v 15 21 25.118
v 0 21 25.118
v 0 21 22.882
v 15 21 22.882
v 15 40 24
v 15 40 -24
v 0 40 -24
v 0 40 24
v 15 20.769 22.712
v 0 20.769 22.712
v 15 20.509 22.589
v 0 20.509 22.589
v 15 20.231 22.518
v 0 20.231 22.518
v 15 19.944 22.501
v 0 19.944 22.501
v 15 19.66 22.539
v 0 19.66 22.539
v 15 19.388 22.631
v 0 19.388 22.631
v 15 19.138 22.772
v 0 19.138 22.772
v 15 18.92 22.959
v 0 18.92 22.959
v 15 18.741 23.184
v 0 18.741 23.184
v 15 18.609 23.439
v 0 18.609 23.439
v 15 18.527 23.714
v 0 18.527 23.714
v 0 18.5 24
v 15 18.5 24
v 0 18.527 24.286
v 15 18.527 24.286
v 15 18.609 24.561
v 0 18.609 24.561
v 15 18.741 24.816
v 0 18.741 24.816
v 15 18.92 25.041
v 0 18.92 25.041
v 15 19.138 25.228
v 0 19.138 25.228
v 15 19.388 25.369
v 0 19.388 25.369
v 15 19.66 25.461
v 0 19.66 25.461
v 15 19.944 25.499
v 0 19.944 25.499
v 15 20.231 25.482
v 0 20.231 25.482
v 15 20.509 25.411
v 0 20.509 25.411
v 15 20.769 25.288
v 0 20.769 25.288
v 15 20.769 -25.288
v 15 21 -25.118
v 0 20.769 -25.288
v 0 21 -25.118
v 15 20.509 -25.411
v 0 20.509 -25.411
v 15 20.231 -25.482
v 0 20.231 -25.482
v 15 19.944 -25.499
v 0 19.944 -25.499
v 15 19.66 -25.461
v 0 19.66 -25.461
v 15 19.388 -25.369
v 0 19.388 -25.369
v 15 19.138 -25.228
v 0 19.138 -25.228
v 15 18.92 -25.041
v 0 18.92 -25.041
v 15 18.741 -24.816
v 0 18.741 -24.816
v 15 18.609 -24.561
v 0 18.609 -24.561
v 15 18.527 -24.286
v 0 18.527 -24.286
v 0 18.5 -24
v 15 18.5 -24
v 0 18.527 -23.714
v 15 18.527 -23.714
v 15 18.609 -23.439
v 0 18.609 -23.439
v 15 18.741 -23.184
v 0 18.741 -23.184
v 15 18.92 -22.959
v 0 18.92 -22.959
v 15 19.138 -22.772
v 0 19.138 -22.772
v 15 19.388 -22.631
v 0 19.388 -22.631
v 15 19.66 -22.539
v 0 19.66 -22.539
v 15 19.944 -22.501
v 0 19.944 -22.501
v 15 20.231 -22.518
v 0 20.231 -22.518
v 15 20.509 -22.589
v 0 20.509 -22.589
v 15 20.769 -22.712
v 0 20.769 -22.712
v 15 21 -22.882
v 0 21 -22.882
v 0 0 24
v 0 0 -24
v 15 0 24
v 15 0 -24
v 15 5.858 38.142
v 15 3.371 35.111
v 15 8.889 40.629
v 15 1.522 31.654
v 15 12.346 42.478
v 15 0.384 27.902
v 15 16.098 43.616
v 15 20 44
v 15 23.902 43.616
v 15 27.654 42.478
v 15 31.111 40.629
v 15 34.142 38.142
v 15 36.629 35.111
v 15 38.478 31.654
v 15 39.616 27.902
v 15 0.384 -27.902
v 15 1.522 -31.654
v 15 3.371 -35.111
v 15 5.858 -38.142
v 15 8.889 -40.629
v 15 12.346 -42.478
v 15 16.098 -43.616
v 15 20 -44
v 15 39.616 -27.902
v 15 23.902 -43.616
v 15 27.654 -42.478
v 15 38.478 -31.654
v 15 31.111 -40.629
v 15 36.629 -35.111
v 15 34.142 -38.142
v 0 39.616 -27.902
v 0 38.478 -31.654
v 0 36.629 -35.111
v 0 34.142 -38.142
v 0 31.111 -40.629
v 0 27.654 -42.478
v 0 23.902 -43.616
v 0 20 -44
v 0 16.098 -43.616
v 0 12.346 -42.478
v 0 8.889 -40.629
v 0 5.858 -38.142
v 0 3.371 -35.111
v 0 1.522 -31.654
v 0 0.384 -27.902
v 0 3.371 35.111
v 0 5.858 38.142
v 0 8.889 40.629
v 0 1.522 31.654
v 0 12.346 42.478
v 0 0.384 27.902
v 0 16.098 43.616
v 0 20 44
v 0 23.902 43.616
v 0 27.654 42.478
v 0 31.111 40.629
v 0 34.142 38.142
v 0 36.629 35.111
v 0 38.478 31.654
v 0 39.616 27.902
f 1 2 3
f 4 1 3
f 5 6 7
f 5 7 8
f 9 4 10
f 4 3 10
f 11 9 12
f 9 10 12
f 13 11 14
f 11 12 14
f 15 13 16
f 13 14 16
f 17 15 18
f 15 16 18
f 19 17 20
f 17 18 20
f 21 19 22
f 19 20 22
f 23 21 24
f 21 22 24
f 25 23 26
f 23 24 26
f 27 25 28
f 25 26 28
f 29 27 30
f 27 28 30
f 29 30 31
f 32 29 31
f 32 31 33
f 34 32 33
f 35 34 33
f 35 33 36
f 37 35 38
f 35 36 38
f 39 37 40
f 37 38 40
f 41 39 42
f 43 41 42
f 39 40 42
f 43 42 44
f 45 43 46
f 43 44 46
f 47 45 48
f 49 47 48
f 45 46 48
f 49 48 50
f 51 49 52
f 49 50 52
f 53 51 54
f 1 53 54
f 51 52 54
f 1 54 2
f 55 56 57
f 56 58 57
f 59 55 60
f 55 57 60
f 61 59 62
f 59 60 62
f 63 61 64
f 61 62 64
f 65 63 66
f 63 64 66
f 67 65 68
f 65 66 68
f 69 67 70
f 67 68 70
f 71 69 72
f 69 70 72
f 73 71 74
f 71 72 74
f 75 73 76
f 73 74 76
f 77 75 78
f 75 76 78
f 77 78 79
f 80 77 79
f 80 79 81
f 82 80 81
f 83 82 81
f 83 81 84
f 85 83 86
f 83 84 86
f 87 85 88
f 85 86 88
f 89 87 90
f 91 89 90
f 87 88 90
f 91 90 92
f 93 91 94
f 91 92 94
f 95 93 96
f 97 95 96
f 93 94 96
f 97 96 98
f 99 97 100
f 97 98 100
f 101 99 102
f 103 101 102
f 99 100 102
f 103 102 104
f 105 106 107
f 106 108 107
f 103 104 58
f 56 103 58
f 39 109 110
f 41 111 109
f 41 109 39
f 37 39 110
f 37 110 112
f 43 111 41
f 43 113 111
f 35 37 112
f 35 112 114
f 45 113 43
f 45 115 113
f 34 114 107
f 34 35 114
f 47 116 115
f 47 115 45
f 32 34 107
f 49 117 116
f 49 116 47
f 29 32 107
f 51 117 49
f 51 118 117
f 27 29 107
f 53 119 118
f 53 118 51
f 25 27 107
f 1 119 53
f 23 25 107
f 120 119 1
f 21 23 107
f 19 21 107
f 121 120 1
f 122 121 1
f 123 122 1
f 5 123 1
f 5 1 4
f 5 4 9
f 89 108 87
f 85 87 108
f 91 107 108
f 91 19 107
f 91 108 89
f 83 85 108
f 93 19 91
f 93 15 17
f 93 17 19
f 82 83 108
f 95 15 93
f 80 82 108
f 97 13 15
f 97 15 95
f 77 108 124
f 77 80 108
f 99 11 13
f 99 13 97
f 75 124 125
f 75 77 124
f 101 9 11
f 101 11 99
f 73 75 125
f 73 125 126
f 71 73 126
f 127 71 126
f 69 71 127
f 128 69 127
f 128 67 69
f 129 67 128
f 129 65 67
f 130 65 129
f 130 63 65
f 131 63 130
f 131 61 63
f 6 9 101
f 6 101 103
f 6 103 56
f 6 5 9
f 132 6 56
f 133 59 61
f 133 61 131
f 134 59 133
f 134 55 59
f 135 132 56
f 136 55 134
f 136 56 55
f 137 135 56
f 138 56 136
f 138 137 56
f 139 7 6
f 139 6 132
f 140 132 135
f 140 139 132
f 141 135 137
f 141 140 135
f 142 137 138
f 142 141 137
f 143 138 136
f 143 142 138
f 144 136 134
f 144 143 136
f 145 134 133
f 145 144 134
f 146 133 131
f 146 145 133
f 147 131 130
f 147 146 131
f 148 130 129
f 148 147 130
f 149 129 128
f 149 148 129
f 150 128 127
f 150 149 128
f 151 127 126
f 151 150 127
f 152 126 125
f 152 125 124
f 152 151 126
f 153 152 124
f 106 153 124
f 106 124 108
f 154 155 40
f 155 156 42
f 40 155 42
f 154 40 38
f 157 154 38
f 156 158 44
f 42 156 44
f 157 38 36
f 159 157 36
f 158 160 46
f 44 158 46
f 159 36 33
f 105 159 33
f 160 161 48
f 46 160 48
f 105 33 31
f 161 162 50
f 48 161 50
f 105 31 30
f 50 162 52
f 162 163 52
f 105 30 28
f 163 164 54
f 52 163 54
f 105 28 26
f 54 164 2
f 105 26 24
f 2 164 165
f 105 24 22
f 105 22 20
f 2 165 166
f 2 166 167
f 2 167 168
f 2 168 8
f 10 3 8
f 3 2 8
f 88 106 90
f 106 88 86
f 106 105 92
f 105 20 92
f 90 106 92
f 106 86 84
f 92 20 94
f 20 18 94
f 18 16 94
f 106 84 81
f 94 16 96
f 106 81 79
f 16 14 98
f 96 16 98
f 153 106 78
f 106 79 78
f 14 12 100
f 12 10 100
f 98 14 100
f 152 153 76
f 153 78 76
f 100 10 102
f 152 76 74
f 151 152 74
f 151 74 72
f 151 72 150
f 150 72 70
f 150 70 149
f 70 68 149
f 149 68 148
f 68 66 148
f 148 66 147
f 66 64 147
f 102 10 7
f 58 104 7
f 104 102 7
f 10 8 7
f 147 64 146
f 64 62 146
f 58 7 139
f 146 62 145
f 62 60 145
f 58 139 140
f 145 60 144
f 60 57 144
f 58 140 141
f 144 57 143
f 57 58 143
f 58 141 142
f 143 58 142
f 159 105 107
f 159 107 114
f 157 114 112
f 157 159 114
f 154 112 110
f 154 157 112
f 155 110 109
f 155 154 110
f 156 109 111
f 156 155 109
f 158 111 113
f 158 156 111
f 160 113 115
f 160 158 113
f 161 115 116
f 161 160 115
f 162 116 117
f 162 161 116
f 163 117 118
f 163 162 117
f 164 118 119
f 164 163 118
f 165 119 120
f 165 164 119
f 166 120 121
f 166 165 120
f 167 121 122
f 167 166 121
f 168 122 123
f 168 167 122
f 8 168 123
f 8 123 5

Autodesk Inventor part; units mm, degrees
ref_plane "YZ Plane" through (0, 0, 0) normal (1, 0, 0) x (0, 1, 0)
ref_plane "XZ Plane" through (0, 0, 0) normal (0, 1, 0) x (-1, 0, 0)
ref_plane "XY Plane" through (0, 0, 0) normal (0, 0, 1) x (1, 0, 0)
sketch "Szkic1" plane through (0, 0, 0) normal (1, 0, 0) x (0, 1, 0)
  line L0 (0, -24) -> (0, 24)
  circle A0 centre (20, 24) radius 20
  circle A1 centre (20, -24) radius 20
  line L1 (40, 24) -> (40, -24)
  line L2 (0, -24) -> (0, 24)
  point P0 (0, 0)
  dimension "d0" = 24
  dimension "d1" = 48
  dimension "d2" = 40
extrude "Wyciągnięcie proste1" add sketch "Szkic1" along normal blind 15 contours A1 | A0
sketch "Szkic2" plane through (15, 20, -24) normal (1, 0, 0) x (0, 0, -1)
  circle A0 centre (0, 0) radius 20 projected
  line L0 (0, -20) -> (-48, -20)
  circle A1 centre (-48, 0) radius 20 projected
  line L1 (0, 20) -> (-48, 20)
  line L2 (-48, 20) -> (-48, -20)
  line L3 (0, 20) -> (0, -20)
  point P0 (-24, -20)
extrude "Wyciągnięcie proste2" add sketch "Szkic2" against normal blind 15 contours A0 L0 A1 L1
sketch "Szkic3" plane through (15, 0, 0) normal (1, 0, 0) x (0, 0, -1)
  line L0 (0, 0) -> (0, 20)
  line L1 (-24, 40) -> (24, 40) projected
  line L2 (0, 20) -> (24, 20)
  line L3 (24, 20) -> (-24, 20)
  arc A0 (22.882, 21) -> (25.118, 21) centre (24, 20) ccw
  arc A1 (-25.118, 21) -> (-22.882, 21) centre (-24, 20) ccw
  line L4 (-24, 18.5) -> (-24, 21)
  line L5 (-24, 21) -> (-22.882, 21)
  line L6 (-24, 21) -> (-25.118, 21)
  line L7 (24, 18.5) -> (24, 21)
  line L8 (24, 21) -> (25.118, 21)
  line L9 (24, 21) -> (22.882, 21)
  dimension "d7" = 20
  dimension "d8" = 24
  dimension "d9" = 48
  dimension "d10" = 3
  dimension "d11" = 3
  dimension "d12" = 2.5
  dimension "d13" = 2.5
hole "Otwór1" at (15, 20, 24) direction (-1, 0, 0) diameter 3 end through all
sketch "Szkic4" plane through (15, 0, 0) normal (1, 0, 0) x (0, 0, -1)
  circle A0 centre (-24, 20) radius 1.5 projected
  line L0 (-24, 20) -> (24, 20)
  point P0 (0, 0)
  dimension "d21" = 48
hole "Otwór2" at (15, 20, -24) direction (-1, 0, 0) diameter 3 end through all
sketch "Szkic5" plane through (15, 0, 0) normal (1, 0, 0) x (0, 0, -1)
  circle A0 centre (-24, 20) radius 1.5 projected
  line L0 (-24, 18.5) -> (-24, 21)
  line L1 (-24, 21) -> (-22.882, 21)
  line L2 (-24, 21) -> (-25.118, 21)
  circle A1 centre (24, 20) radius 1.5 projected
  line L3 (24, 18.5) -> (24, 21)
  line L4 (24, 21) -> (25.118, 21)
  line L5 (24, 21) -> (22.882, 21)
  point P0 (0, 0)
  dimension "d29" = 2.5
  dimension "d30" = 2.5
extrude "Wyciągnięcie proste3" add sketch "Szkic5" against normal blind 15 contours L1 L2 A0 | L4 L5 A1
properties part number "gasienice"
